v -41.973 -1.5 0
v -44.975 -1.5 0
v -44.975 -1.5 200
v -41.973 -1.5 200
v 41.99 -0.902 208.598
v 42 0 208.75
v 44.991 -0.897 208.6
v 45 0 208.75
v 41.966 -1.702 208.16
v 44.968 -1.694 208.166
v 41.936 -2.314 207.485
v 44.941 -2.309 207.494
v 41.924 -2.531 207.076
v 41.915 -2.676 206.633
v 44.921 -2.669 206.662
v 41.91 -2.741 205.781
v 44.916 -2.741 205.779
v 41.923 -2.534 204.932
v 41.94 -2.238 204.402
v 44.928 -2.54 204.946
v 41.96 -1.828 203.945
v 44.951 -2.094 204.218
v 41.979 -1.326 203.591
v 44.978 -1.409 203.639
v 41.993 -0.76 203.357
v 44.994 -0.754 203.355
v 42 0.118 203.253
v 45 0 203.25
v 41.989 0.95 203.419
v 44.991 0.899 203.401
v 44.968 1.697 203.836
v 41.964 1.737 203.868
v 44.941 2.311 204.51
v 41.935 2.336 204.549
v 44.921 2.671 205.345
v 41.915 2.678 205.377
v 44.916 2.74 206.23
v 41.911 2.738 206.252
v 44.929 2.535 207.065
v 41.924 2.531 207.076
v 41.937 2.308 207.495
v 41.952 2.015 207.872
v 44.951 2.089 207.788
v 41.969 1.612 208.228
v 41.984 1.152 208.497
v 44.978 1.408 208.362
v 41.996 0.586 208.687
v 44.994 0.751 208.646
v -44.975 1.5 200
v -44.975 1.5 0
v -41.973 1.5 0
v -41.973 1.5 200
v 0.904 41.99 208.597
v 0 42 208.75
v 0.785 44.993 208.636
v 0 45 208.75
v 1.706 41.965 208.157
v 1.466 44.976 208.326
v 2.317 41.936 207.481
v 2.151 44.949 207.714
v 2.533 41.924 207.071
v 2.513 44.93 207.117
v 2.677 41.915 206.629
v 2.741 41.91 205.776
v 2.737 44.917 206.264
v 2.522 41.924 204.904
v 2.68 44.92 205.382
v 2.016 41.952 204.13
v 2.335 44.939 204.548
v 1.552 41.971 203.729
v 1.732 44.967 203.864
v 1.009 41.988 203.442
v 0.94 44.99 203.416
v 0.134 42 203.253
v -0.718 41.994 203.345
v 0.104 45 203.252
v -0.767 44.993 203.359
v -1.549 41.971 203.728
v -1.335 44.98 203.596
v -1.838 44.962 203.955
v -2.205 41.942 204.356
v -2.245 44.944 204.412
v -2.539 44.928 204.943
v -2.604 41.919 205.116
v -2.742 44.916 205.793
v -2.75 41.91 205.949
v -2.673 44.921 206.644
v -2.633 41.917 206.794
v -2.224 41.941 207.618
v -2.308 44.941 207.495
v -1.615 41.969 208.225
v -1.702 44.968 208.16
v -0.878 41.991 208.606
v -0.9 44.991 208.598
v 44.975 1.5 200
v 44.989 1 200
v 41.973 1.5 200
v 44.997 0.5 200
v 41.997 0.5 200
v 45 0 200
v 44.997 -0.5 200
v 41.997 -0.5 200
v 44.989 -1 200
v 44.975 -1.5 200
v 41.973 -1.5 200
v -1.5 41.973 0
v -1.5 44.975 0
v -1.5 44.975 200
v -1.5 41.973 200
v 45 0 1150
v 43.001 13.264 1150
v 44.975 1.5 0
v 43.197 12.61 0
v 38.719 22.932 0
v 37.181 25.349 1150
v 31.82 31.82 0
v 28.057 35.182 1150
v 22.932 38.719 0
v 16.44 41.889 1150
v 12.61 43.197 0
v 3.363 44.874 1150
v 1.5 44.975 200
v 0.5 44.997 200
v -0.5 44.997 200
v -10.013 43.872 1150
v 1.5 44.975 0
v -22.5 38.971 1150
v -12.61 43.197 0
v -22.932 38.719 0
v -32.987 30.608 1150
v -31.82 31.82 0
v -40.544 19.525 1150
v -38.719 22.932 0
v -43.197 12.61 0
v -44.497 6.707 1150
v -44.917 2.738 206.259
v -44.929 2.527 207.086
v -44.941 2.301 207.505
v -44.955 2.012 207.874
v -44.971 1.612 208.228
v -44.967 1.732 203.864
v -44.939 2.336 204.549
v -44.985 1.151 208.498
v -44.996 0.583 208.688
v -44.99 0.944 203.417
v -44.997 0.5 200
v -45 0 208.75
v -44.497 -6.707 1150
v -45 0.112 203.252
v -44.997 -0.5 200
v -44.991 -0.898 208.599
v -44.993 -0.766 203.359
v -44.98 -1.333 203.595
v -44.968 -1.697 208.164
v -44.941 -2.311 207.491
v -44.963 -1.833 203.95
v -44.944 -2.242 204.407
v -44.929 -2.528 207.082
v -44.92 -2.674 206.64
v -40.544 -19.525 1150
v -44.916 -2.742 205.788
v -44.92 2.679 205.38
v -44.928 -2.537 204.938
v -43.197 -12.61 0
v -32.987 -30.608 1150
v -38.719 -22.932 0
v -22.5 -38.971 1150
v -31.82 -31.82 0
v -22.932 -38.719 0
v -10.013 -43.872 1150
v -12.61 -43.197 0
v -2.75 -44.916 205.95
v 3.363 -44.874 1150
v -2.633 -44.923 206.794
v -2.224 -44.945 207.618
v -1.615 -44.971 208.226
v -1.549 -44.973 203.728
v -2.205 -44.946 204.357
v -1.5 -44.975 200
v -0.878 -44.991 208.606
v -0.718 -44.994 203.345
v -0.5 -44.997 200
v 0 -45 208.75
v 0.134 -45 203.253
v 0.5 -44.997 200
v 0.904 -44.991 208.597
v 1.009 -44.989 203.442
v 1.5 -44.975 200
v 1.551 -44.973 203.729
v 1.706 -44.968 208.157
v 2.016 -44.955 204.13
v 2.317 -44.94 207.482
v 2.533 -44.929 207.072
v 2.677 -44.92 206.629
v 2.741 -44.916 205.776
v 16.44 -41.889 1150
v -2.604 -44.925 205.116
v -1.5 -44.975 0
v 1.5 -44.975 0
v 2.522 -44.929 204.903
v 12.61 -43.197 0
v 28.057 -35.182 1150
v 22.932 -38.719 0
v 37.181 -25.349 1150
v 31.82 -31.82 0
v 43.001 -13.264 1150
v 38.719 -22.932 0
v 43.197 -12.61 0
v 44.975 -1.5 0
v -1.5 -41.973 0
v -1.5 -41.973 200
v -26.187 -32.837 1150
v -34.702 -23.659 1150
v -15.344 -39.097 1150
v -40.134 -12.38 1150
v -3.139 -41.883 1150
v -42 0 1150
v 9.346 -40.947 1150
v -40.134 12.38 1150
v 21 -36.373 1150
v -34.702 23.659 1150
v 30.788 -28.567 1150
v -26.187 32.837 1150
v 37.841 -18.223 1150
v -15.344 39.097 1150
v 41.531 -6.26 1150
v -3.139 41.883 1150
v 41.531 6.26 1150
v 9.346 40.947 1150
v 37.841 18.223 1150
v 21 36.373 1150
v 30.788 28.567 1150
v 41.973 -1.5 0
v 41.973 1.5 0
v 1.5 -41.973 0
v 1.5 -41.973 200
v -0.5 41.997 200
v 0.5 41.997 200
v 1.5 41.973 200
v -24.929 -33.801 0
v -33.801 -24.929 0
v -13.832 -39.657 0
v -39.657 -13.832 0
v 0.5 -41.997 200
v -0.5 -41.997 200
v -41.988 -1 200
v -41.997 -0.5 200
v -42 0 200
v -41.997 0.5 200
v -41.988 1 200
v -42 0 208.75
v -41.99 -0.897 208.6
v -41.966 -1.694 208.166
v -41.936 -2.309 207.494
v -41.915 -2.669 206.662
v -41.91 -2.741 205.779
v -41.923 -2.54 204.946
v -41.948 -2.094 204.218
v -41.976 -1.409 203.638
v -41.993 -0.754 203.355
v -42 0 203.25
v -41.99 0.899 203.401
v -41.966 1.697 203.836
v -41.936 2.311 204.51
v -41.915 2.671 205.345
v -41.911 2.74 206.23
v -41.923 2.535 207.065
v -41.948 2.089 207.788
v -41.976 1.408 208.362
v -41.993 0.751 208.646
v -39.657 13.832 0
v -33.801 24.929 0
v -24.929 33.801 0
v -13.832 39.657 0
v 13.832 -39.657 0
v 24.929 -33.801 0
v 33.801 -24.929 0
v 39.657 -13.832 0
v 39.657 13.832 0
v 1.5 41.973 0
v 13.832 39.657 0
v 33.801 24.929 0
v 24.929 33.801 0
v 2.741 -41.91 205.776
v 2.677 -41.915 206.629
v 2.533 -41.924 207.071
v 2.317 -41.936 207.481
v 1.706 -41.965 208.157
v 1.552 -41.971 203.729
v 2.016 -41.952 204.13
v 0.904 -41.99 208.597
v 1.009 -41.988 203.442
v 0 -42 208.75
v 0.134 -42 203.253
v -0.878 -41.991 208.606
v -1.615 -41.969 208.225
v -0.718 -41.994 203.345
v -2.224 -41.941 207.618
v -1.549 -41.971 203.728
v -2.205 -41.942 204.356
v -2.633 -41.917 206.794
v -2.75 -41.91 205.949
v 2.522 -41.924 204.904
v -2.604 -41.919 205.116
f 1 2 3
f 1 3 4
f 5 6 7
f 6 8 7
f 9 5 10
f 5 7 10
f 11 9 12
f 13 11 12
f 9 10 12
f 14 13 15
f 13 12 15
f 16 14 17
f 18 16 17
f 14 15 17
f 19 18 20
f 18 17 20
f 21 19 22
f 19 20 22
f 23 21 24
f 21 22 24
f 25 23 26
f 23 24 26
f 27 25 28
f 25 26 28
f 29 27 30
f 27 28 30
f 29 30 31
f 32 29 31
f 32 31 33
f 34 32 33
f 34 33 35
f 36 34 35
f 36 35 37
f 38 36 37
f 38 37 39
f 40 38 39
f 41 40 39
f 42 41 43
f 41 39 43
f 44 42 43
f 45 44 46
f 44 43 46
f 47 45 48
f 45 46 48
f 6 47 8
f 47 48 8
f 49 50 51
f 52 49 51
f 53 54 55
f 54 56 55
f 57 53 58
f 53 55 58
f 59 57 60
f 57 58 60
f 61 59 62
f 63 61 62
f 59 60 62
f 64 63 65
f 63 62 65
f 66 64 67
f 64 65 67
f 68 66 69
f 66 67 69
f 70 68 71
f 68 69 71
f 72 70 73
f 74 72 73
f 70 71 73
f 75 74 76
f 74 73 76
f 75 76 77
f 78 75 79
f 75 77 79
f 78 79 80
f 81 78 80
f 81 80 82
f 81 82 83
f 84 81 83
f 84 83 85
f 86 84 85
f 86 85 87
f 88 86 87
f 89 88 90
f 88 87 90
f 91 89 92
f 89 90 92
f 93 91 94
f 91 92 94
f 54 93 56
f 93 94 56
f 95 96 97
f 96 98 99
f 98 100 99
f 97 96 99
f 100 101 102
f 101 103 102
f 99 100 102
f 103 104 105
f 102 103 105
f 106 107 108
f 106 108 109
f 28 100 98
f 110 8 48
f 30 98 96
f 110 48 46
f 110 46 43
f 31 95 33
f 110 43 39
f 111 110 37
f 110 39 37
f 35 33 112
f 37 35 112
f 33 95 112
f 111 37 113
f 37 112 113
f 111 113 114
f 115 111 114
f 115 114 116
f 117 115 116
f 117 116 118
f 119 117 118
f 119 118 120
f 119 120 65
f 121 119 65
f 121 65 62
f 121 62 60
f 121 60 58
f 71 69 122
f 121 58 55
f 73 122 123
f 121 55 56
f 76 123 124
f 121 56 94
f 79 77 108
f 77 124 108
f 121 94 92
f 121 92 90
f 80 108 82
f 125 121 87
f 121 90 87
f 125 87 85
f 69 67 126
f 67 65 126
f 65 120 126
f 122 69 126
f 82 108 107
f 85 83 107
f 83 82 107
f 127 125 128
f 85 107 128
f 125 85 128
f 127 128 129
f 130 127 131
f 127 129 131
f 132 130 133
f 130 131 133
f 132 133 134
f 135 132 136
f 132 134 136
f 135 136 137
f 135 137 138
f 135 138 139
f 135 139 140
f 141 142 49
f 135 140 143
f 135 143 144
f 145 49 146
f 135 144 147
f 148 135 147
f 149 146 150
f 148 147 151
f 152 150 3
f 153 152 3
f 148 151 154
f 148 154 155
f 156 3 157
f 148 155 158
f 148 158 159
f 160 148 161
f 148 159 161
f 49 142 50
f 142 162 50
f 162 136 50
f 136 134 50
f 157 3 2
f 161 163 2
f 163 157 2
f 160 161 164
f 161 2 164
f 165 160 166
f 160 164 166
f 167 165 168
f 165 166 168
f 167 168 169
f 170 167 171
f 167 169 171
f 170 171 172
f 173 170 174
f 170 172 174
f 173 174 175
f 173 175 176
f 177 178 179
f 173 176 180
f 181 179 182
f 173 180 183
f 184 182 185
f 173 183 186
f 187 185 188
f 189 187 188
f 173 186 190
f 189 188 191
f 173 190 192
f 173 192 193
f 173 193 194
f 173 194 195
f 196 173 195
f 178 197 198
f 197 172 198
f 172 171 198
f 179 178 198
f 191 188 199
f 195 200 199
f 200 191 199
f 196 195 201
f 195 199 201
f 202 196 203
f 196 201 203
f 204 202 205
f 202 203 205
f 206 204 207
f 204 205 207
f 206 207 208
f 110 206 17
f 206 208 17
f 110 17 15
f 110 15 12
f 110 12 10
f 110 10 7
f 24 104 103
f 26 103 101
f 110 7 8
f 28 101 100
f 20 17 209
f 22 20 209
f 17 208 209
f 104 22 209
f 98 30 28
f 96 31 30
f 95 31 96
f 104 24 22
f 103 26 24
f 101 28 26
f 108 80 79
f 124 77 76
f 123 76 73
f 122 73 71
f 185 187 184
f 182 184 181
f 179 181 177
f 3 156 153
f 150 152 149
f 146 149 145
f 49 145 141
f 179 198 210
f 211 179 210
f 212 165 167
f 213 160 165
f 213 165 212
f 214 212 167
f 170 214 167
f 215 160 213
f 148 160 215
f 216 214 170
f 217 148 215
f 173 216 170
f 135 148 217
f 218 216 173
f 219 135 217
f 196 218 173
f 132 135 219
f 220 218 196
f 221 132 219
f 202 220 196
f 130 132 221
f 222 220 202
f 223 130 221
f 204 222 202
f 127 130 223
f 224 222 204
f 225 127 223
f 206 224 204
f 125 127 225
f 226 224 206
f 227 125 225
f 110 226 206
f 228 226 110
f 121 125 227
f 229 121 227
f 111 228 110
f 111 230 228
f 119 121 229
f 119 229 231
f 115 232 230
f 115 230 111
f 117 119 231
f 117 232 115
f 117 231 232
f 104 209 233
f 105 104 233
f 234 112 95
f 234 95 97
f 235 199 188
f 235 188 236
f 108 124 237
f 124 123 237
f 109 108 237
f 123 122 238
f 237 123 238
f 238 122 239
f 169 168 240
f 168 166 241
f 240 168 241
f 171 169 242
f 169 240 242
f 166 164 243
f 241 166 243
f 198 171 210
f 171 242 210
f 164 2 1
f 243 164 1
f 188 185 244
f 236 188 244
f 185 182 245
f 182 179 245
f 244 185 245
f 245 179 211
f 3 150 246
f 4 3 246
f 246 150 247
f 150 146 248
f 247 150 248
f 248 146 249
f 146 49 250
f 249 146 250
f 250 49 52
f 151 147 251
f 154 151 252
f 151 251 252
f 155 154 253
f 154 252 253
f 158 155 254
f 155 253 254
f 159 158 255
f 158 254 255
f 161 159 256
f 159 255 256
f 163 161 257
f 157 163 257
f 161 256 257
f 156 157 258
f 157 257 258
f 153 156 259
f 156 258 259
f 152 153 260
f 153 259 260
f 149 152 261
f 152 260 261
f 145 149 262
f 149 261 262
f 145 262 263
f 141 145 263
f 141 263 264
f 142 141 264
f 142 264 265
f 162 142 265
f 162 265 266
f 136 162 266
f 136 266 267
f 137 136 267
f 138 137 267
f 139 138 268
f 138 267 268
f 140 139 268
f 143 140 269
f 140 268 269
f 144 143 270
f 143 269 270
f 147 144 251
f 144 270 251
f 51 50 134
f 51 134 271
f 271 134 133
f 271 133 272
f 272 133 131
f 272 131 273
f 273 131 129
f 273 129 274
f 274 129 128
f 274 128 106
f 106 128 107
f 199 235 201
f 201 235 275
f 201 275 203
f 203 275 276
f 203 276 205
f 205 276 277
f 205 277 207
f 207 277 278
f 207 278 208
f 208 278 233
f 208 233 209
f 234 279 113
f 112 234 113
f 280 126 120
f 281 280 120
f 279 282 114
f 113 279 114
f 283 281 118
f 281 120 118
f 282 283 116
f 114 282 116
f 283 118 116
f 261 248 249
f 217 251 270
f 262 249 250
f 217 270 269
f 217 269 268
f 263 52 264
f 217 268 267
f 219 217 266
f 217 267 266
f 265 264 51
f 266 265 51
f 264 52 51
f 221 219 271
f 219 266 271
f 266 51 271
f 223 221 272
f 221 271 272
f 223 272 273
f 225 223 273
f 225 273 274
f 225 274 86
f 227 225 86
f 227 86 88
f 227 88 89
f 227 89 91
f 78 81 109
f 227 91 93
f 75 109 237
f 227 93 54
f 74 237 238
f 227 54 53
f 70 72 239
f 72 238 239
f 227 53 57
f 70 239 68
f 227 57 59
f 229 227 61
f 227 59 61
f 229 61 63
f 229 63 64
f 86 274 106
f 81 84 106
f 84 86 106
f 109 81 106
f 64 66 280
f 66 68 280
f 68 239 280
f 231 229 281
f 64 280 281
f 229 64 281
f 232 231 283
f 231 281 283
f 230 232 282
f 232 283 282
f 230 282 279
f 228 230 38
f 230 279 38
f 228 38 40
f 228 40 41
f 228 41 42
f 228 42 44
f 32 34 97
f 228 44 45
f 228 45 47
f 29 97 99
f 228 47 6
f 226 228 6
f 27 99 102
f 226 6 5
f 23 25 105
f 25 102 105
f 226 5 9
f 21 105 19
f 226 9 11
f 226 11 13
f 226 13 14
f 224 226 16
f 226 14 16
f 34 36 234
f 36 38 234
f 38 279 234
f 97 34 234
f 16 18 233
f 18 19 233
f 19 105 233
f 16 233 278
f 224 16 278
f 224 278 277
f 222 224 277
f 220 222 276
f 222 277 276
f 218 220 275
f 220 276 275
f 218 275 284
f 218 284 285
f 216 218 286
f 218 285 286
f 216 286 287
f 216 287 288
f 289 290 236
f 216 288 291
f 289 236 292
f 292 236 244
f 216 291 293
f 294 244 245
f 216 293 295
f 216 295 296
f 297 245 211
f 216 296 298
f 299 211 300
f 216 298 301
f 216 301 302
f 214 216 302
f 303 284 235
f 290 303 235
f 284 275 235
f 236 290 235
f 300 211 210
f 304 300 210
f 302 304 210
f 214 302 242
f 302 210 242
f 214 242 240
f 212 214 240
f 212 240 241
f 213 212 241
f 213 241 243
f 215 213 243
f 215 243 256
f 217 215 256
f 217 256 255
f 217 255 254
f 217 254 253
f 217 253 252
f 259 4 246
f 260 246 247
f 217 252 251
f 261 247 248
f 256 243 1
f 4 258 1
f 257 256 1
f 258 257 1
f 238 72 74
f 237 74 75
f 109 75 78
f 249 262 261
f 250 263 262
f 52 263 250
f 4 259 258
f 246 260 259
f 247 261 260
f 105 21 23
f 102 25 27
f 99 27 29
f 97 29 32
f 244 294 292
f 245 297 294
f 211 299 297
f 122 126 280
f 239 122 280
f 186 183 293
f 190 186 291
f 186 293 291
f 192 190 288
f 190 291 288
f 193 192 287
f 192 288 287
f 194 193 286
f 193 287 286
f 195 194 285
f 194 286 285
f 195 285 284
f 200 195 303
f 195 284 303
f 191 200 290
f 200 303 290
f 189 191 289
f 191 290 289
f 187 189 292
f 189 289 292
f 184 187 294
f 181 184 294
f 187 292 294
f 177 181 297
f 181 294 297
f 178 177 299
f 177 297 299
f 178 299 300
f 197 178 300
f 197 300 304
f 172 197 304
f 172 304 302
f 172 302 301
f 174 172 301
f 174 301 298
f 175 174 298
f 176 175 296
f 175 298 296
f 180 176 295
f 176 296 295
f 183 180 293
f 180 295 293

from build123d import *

# Parameters (mm, degrees)
ESQUISSE1_R                            = 45
BOSS_EXTRU_1_DEPTH                     = 1150
ESQUISSE2_R                            = 42
ENL_V_MAT_EXTRU_1_DEPTH                = 1150
ESQUISSE3_W                            = 10
ESQUISSE3_H                            = 3
ENL_V_MAT_EXTRU_2_DEPTH                = 200
R_P_TITION_CIRCULAIRE1_COUNT           = 4
ESQUISSE5_W                            = 2.75
ESQUISSE5_H                            = 90
D_GAGEMENT_M51_AT_2_COUNT              = 2
D_GAGEMENT_M51_AT_2_PITCH              = 214.601725843
R_P_TITION_CIRCULAIRE2_COUNT           = 2
R_P_TITION_CIRCULAIRE2_ANGLE           = 90
R_P_TITION_CIRCULAIRE2_COPY_1_SKETCH_W = 2.75
R_P_TITION_CIRCULAIRE2_COPY_1_SKETCH_H = 90


with BuildPart() as part:
    # Esquisse1 → Boss.-Extru.1 (new body)
    with BuildSketch(Plane.XY):
        Circle(ESQUISSE1_R)
    extrude(amount=BOSS_EXTRU_1_DEPTH)

    # Esquisse2 → Enlèv. mat.-Extru.1 (cut)
    with BuildSketch(Plane(origin=(0, 0, 0), x_dir=(-1, 0, 0), z_dir=(0, 0, -1))):
        Circle(ESQUISSE2_R)
    extrude(amount=-ENL_V_MAT_EXTRU_1_DEPTH, mode=Mode.SUBTRACT)

    # Esquisse3 → Enlèv. mat.-Extru.2 (cut)
    with BuildSketch(Plane.XY):
        with Locations((-45, 0)):
            Rectangle(ESQUISSE3_W, ESQUISSE3_H)
    enl_v_mat_extru_2 = extrude(amount=ENL_V_MAT_EXTRU_2_DEPTH, mode=Mode.SUBTRACT)

    # Répétition circulaire1: Enlèv. mat.-Extru.2 ×4 about axis
    r_p_tition_circulaire1_axis = Axis((0, 0, 0), (0, 0, 1))
    for i in range(1, R_P_TITION_CIRCULAIRE1_COUNT):
        add(enl_v_mat_extru_2.rotate(r_p_tition_circulaire1_axis, i * 360 / R_P_TITION_CIRCULAIRE1_COUNT), mode=Mode.SUBTRACT)

    # Esquisse5 → Dégagement M51 (revolve, cut)
    with BuildSketch(Plane(origin=(-45, 0, 206), x_dir=(0, 0, 1), z_dir=(0, 1, 0))):
        with Locations((1.375, 45)):
            Rectangle(ESQUISSE5_W, ESQUISSE5_H)
    d_gagement_m51 = revolve(axis=Axis((-51.35, 0, 206), (1, 0, 0)), mode=Mode.SUBTRACT)

    # Dégagement M51 at 2: Dégagement M51 ×2
    with Locations(*[Vector(0, -0.280281939, -0.959917723) * (i * D_GAGEMENT_M51_AT_2_PITCH) for i in range(1, D_GAGEMENT_M51_AT_2_COUNT)]):
        add(d_gagement_m51, mode=Mode.SUBTRACT)

    # Répétition circulaire2: Dégagement M51 ×2 about axis
    r_p_tition_circulaire2_axis = Axis((0, 0, 0), (0, 0, 1))
    for i in range(1, R_P_TITION_CIRCULAIRE2_COUNT):
        add(d_gagement_m51.rotate(r_p_tition_circulaire2_axis, i * R_P_TITION_CIRCULAIRE2_ANGLE / (R_P_TITION_CIRCULAIRE2_COUNT - 1)), mode=Mode.SUBTRACT)

    # Répétition circulaire2 copy 1 sketch → Répétition circulaire2 copy 1 (revolve, cut)
    with BuildSketch(Plane(origin=(60.14898781, -45, 0), x_dir=(0, 0, 1), z_dir=(-1, 0, 0))):
        with Locations((1.375, 45)):
            Rectangle(R_P_TITION_CIRCULAIRE2_COPY_1_SKETCH_W, R_P_TITION_CIRCULAIRE2_COPY_1_SKETCH_H)
    revolve(axis=Axis((60.14898781, -51.35, 0), (0, 1, 0)), mode=Mode.SUBTRACT)


solid = part.part
